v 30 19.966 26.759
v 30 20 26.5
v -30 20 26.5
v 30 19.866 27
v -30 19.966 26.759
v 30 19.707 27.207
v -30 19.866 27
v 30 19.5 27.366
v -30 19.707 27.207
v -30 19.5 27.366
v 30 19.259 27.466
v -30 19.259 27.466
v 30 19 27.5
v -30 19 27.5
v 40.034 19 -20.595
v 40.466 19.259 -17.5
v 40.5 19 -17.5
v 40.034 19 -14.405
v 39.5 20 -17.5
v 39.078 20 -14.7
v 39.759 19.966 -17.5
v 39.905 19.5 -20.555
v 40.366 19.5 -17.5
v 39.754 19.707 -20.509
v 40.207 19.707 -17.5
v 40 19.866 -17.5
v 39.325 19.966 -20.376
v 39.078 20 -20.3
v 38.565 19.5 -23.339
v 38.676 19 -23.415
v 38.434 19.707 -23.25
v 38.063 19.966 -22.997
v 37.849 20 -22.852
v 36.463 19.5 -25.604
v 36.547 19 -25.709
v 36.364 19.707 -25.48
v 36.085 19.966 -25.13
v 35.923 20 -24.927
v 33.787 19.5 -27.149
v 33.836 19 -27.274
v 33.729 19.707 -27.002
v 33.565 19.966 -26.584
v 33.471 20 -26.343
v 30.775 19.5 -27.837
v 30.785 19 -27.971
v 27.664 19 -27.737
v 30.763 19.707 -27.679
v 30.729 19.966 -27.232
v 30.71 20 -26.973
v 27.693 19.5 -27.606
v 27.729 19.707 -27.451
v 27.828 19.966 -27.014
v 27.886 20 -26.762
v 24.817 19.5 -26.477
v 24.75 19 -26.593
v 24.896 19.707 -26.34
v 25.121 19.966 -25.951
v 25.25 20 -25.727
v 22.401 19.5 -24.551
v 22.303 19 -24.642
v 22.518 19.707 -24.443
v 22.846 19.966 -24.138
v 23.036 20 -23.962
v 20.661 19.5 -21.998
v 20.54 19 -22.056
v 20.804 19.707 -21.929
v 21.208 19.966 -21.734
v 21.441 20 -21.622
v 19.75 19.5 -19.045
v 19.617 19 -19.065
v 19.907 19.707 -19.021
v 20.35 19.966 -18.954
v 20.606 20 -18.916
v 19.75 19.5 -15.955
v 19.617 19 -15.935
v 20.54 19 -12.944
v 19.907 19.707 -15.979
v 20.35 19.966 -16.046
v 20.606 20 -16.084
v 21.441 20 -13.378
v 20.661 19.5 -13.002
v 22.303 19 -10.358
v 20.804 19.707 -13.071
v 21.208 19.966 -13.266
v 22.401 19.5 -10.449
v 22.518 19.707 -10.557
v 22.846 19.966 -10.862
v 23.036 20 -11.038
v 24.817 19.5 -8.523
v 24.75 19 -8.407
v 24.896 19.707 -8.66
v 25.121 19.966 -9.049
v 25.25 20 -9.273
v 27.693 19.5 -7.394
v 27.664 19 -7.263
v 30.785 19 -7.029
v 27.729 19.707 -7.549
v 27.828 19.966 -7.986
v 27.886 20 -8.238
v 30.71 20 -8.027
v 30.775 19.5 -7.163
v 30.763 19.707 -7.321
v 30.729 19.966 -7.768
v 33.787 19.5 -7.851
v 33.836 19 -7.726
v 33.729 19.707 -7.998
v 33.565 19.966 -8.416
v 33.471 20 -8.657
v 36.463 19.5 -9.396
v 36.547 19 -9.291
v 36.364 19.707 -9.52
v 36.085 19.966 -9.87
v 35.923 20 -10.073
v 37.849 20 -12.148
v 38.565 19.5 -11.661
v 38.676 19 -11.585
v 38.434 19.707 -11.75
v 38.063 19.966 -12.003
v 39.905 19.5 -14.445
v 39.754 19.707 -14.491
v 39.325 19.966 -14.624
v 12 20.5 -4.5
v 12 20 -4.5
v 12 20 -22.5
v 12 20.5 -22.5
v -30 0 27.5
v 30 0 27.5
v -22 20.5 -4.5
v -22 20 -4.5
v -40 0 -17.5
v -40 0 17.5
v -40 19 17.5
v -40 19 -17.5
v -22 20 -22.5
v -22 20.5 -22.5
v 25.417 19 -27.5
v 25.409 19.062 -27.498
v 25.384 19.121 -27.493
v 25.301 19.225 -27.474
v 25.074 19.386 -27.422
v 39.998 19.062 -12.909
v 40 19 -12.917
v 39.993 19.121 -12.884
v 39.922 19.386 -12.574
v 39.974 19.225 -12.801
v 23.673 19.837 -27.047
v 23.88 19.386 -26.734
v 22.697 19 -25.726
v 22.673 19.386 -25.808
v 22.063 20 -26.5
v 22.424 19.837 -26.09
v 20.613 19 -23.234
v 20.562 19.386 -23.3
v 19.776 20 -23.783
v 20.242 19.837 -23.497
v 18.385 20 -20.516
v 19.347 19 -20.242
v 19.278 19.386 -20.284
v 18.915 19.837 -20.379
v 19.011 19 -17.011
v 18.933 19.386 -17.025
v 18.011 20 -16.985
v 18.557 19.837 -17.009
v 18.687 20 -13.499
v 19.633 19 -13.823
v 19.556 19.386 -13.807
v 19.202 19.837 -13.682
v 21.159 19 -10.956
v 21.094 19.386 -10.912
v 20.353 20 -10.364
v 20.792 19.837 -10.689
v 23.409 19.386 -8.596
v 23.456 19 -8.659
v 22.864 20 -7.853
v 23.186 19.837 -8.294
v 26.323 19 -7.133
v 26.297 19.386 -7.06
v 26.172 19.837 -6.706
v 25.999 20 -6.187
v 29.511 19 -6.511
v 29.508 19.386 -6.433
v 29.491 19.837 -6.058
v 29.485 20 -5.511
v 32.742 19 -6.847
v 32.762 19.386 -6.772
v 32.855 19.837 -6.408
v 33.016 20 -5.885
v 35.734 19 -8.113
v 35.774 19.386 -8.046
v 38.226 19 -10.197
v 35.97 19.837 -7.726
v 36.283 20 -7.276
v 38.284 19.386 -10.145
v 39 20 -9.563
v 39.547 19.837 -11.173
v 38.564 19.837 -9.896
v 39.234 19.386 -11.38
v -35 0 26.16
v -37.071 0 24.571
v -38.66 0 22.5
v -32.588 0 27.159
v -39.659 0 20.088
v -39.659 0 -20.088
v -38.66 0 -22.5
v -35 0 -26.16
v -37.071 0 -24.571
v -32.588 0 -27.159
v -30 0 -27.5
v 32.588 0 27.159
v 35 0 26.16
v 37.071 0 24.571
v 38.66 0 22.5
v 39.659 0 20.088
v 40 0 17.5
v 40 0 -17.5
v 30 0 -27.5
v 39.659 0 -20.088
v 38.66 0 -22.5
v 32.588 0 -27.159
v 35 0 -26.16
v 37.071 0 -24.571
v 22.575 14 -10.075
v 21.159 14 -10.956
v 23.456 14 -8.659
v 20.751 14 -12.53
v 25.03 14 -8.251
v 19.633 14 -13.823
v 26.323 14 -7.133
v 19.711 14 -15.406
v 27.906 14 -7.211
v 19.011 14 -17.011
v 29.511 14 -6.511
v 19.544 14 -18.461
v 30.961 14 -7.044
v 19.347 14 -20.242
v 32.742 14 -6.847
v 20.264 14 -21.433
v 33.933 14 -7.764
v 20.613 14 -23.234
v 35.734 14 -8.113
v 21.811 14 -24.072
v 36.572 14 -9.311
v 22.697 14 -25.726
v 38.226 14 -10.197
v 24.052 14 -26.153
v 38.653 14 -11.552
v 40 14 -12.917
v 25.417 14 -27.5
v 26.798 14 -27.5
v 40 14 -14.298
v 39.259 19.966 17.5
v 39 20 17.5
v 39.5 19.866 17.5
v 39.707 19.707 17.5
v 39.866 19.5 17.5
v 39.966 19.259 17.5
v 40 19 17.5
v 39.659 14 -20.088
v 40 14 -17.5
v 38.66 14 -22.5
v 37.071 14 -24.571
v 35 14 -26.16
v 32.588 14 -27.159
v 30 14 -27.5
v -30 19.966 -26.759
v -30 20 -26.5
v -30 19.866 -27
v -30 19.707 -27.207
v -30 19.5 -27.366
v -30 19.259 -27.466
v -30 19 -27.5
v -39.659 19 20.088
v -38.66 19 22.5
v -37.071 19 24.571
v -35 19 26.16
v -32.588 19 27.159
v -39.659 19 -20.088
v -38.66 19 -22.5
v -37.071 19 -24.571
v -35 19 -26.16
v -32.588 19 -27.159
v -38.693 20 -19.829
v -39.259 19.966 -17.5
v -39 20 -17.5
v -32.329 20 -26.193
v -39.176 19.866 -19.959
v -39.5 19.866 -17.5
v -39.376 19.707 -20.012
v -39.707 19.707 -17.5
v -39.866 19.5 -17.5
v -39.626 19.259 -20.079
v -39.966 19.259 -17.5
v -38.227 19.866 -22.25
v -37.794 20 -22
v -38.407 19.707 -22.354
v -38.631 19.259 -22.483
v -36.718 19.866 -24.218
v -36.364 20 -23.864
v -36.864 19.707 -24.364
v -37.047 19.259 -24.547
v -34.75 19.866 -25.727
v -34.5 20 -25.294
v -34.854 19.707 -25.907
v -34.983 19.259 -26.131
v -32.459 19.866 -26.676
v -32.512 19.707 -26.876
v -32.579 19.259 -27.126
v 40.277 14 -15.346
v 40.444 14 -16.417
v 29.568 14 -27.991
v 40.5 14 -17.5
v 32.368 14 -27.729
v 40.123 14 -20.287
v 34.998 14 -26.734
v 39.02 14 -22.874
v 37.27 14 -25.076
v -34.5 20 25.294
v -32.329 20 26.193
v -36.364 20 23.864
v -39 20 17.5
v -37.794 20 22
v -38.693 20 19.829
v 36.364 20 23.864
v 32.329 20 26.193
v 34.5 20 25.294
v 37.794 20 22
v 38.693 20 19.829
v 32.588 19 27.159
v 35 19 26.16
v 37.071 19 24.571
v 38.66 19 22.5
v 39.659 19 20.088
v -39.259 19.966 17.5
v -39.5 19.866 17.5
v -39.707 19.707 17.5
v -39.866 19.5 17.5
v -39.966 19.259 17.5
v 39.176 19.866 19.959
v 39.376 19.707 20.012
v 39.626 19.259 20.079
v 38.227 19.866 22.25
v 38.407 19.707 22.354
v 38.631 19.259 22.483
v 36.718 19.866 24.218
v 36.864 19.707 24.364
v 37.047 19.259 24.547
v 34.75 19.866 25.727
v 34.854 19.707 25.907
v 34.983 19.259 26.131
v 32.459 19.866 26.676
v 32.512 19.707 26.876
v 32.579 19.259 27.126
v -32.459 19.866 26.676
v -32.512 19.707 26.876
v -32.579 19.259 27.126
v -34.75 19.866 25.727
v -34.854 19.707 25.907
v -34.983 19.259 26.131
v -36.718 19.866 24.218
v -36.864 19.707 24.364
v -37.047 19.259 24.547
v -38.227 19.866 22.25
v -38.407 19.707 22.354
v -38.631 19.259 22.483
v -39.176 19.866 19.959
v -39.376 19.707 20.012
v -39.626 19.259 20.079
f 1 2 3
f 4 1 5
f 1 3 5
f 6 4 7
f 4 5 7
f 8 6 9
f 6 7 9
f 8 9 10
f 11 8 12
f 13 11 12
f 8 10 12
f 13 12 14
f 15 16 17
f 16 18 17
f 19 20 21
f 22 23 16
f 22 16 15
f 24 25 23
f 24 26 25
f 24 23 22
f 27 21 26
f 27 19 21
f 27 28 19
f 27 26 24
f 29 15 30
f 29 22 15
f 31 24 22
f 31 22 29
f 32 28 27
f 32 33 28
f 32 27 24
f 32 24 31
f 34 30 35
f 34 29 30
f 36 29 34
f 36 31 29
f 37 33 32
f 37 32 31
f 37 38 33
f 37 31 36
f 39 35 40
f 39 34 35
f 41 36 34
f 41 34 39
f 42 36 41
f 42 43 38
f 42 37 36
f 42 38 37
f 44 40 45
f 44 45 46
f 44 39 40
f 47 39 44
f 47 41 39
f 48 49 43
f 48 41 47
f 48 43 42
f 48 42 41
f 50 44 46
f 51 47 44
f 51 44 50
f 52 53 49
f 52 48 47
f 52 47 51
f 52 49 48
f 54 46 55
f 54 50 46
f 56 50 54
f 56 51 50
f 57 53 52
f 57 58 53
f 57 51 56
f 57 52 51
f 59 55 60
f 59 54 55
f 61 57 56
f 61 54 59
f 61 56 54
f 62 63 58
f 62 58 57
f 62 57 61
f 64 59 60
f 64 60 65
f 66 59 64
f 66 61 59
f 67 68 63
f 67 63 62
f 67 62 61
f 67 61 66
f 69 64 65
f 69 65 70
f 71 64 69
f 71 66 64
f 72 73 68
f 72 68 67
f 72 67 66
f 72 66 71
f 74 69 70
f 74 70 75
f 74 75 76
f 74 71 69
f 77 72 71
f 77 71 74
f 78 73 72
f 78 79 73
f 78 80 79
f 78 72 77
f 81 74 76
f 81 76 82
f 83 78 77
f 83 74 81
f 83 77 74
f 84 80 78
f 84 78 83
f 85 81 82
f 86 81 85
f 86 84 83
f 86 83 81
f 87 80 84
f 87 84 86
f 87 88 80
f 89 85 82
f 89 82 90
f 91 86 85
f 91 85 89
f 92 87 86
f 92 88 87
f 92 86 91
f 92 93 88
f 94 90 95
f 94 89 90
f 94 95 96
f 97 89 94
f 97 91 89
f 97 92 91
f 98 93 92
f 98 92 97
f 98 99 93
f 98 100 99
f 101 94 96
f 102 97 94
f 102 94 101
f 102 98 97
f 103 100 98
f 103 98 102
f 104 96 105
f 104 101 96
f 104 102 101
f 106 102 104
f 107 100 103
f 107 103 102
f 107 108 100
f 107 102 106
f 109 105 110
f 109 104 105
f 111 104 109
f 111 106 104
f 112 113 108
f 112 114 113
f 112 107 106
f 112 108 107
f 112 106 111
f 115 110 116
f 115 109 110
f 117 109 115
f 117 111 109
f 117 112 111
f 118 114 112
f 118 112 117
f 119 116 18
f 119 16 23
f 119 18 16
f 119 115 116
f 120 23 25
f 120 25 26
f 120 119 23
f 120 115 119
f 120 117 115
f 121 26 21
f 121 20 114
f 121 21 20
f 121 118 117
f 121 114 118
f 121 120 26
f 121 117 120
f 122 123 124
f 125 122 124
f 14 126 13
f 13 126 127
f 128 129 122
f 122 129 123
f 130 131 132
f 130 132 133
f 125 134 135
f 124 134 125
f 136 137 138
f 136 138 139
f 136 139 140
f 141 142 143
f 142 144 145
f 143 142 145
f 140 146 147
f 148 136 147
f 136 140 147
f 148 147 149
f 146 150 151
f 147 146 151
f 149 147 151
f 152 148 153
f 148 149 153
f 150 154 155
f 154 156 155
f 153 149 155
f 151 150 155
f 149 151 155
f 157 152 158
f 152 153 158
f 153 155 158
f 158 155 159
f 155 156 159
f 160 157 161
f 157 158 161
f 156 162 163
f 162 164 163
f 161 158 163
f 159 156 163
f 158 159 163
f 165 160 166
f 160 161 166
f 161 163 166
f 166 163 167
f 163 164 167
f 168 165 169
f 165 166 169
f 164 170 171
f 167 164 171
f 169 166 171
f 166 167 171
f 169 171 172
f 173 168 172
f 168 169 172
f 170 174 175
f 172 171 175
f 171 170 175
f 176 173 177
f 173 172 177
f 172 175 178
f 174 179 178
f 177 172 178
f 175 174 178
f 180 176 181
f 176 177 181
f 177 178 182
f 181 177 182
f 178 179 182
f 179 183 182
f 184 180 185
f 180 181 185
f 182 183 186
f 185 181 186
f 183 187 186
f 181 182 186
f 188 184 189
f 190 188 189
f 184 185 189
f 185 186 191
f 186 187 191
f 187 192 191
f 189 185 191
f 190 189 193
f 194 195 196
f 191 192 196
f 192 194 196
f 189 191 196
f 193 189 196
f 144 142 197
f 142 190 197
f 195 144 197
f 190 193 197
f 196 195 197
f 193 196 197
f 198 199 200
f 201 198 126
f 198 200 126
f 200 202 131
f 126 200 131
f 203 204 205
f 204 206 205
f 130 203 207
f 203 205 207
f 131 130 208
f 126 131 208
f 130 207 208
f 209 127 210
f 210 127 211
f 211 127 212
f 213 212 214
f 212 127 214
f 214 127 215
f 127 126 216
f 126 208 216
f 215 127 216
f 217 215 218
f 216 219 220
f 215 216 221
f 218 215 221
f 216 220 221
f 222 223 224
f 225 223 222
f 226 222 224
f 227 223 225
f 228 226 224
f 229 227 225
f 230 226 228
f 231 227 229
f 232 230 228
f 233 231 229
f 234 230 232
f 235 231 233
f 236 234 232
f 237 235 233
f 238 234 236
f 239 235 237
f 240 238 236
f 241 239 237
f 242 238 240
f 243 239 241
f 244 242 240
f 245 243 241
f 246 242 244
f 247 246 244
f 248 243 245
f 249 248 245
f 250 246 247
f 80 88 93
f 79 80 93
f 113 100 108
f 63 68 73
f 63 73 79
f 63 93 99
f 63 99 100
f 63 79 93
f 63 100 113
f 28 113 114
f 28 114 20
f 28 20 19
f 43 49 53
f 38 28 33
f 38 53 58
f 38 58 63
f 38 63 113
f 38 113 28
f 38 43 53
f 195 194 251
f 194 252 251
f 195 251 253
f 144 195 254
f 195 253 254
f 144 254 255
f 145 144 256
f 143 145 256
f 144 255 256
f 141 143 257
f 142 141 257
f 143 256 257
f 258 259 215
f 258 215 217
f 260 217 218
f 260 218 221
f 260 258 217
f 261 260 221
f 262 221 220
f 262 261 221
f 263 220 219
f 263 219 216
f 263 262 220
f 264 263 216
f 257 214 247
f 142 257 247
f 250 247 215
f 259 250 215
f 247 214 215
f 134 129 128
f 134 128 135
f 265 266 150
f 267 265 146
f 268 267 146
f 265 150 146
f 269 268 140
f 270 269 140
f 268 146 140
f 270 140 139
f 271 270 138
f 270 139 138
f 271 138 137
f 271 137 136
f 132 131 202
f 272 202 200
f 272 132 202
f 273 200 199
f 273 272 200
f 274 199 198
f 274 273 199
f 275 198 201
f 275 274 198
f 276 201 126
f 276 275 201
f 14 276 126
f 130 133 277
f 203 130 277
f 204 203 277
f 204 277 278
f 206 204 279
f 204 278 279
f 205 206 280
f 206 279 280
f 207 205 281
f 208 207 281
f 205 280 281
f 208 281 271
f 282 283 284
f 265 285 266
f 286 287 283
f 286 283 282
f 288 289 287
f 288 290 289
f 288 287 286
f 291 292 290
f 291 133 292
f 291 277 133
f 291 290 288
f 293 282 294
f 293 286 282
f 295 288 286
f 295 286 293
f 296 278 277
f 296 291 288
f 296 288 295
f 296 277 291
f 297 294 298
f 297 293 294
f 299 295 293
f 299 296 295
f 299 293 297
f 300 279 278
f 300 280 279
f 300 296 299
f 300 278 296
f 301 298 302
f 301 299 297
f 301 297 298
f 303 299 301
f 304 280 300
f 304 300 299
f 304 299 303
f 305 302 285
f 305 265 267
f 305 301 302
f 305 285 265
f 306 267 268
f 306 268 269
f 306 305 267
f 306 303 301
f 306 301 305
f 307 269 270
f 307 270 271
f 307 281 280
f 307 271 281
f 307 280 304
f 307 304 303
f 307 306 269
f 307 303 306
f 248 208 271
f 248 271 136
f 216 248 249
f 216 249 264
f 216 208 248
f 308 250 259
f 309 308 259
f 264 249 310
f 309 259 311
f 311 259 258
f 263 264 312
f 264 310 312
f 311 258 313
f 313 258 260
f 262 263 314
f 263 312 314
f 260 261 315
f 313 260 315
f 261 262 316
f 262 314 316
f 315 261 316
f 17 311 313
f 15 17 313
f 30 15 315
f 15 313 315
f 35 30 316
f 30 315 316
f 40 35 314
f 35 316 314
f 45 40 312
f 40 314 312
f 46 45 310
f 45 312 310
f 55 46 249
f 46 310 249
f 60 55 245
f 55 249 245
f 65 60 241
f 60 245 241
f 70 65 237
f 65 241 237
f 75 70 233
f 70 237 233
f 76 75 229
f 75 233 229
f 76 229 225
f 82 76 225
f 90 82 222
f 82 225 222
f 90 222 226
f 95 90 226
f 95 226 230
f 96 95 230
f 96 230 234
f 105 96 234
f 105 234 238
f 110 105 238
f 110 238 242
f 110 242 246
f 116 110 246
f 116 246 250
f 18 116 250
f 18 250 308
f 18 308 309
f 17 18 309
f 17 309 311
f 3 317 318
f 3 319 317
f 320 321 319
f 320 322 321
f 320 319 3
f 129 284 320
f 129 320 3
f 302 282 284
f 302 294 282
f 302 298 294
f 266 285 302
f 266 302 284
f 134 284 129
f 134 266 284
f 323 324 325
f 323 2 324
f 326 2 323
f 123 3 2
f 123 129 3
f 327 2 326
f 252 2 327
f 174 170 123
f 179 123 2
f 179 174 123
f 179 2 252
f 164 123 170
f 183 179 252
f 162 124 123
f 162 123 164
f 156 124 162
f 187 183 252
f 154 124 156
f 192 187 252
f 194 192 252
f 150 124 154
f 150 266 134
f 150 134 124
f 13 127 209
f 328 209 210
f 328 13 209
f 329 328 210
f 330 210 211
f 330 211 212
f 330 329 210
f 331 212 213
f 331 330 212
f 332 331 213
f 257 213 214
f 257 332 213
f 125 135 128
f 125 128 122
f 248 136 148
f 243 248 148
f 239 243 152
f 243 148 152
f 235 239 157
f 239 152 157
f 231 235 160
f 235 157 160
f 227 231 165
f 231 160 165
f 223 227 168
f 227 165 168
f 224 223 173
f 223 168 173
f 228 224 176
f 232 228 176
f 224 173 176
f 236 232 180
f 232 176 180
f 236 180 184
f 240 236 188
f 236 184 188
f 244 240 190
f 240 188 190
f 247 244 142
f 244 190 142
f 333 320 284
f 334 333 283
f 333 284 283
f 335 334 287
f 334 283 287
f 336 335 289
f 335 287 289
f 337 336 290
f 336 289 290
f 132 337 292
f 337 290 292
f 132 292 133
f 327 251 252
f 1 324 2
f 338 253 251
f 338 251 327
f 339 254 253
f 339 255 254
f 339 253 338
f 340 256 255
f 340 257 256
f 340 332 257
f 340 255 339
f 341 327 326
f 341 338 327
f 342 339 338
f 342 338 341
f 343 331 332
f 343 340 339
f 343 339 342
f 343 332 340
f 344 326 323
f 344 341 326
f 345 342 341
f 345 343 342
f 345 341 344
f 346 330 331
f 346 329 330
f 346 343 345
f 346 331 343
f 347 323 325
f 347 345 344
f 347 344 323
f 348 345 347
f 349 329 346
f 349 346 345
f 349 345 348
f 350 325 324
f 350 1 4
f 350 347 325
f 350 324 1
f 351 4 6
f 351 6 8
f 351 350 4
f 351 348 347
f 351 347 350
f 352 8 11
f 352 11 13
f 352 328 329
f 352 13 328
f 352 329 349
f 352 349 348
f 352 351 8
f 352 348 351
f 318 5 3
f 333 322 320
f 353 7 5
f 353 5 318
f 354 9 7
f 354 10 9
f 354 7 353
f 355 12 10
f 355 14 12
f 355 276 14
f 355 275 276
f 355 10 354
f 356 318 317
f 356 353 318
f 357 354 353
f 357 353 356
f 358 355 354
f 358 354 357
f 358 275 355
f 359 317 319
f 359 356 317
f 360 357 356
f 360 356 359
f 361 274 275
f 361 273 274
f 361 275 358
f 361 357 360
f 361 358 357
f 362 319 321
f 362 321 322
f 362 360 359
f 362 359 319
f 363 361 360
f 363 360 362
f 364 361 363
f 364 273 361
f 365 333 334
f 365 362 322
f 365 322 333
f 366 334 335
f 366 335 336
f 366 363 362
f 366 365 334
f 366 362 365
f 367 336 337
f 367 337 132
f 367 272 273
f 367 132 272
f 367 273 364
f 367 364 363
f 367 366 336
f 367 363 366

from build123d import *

# Parameters (mm, degrees)
SKETCH1_W           = 80
SKETCH1_H           = 55
BOSS_EXTRUDE2_DEPTH = 20
FILLET1_R           = 10
SKETCH3_R           = 11
CUT_EXTRUDE2_DEPTH  = 6
SKETCH5_W           = 34
SKETCH5_H           = 18
CUT_EXTRUDE3_DEPTH  = 2
SKETCH6_R           = 10.5
BOSS_EXTRUDE3_DEPTH = 6
FILLET2_R           = 1
FILLET3_R           = 1
SKETCH7_W           = 34
SKETCH7_H           = 18
BOSS_EXTRUDE4_DEPTH = 2.5


with BuildPart() as part:
    # Sketch1 → Boss-Extrude2 (new body)
    with BuildSketch(Plane(origin=(0, 0, 0), x_dir=(1, 0, 0), z_dir=(0, 1, 0))):
        Rectangle(SKETCH1_W, SKETCH1_H)
    extrude(amount=BOSS_EXTRUDE2_DEPTH)

    # Fillet1
    fillet1_edges = [part.edges().sort_by_distance(p)[0] for p in [
        (40, 10, 27.5),
        (-40, 10, 27.5),
        (-40, 10, -27.5),
        (40, 10, -27.5),
    ]]
    fillet(fillet1_edges, radius=FILLET1_R)

    # Sketch3 → Cut-Extrude2 (cut)
    with BuildSketch(Plane(origin=(0, 20, 0), x_dir=(1, 0, 0), z_dir=(0, 1, 0))):
        with Locations((30, 17.5)):
            Circle(SKETCH3_R)
    extrude(amount=-CUT_EXTRUDE2_DEPTH, mode=Mode.SUBTRACT)

    # Sketch5 → Cut-Extrude3 (cut)
    with BuildSketch(Plane(origin=(0, 20, 0), x_dir=(1, 0, 0), z_dir=(0, 1, 0))):
        with Locations((-5, 13.5)):
            Rectangle(SKETCH5_W, SKETCH5_H)
    extrude(amount=-CUT_EXTRUDE3_DEPTH, mode=Mode.SUBTRACT)

    # Sketch6 → Boss-Extrude3 (add)
    with BuildSketch(Plane(origin=(0, 14, 0), x_dir=(1, 0, 0), z_dir=(0, 1, 0))):
        with Locations((30, 17.5)):
            Circle(SKETCH6_R)
    extrude(amount=BOSS_EXTRUDE3_DEPTH)

    # Fillet2
    fillet2_edges = [part.edges().sort_by_distance(p)[0] for p in [
        (-40, 20, 0),
        (40, 20, 2.291287847),
        (0, 20, 27.5),
        (-37.071067812, 20, 24.571067812),
        (37.071067812, 20, 24.571067812),
        (-37.071067812, 20, -24.571067812),
        (-2.291287847, 20, -27.5),
        (22.221825407, 20, -9.721825407),
    ]]
    fillet(fillet2_edges, radius=FILLET2_R)

    # Fillet3
    fillet3_edges = [part.edges().sort_by_distance(p)[0] for p in [
        (19.5, 20, -17.5),
    ]]
    fillet(fillet3_edges, radius=FILLET3_R)

    # Sketch7 → Boss-Extrude4 (add)
    with BuildSketch(Plane(origin=(0, 18, 0), x_dir=(1, 0, 0), z_dir=(0, 1, 0))):
        with Locations((-5, 13.5)):
            Rectangle(SKETCH7_W, SKETCH7_H)
    extrude(amount=BOSS_EXTRUDE4_DEPTH)


solid = part.part
